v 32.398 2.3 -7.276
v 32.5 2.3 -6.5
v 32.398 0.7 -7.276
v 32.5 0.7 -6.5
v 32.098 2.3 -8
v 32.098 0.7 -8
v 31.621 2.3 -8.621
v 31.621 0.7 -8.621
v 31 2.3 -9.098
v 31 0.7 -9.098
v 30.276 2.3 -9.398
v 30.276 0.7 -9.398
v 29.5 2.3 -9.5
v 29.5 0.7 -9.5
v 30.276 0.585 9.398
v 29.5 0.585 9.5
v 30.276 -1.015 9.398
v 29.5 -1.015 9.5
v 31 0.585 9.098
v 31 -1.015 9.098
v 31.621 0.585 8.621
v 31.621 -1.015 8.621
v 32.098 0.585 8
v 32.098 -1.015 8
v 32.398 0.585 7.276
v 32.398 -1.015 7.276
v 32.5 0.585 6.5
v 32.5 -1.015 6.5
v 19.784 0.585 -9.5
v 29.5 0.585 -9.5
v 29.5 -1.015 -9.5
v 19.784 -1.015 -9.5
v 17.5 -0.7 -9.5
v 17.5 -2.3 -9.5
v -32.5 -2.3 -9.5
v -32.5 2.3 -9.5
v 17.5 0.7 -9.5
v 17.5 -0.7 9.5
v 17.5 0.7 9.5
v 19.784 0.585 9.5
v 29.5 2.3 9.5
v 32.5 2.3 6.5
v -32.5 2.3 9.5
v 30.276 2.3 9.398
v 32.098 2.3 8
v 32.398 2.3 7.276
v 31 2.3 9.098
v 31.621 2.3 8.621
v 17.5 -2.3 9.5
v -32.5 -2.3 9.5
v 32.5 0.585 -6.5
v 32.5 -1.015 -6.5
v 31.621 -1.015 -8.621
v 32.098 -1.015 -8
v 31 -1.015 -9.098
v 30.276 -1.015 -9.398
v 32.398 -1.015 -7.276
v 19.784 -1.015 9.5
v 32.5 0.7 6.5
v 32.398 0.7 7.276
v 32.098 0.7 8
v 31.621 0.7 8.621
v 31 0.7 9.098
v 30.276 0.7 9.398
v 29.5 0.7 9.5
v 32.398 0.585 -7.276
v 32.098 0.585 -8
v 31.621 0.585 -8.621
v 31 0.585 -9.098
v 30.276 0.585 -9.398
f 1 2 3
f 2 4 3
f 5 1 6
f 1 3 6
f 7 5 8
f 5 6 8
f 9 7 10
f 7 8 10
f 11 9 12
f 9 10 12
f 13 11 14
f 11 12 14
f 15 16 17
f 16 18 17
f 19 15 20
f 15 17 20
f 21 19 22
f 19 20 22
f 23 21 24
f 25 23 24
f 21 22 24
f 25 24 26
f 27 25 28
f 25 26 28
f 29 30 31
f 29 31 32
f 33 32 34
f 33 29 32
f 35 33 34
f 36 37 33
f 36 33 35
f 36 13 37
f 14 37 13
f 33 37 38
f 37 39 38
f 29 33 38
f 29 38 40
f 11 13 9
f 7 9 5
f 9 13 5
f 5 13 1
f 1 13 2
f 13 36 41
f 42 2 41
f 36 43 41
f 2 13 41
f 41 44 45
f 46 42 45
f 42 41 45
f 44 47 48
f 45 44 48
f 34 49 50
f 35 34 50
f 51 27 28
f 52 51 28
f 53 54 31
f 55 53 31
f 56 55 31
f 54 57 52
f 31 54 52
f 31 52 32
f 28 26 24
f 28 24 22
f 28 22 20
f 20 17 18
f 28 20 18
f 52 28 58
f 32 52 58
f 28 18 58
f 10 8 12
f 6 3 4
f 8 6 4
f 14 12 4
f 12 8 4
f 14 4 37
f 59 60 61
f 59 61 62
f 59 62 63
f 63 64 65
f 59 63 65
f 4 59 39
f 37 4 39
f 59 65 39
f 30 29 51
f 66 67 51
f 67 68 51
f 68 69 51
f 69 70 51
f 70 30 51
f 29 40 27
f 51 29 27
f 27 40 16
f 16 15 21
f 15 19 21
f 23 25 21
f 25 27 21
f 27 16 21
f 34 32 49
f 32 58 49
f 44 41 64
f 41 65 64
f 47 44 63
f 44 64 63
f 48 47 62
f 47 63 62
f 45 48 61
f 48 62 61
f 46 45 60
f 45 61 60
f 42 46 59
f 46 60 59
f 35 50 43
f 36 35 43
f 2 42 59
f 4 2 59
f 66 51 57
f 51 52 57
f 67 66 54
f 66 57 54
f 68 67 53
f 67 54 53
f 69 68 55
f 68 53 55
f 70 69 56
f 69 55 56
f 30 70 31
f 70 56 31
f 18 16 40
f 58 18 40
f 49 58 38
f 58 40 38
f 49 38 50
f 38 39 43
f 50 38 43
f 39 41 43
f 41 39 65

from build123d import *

# Parameters (mm, degrees)
BOSS_EXTRUDE1_DEPTH = 9.5
FILLET1_R           = 3


with BuildPart() as part:
    # Sketch1 → Boss-Extrude1 (new body, symmetric)
    with BuildSketch(Plane.XY):
        Polygon((-32.5, 2.3), (32.5, 2.3), (32.5, 0.7), (17.5, 0.7), (17.5, -0.7), (19.784478645, 0.584636857), (32.5, 0.584636857), (32.5, -1.015363143), (19.784478645, -1.015363143), (17.5, -2.3), (-32.5, -2.3), align=None)
    extrude(amount=BOSS_EXTRUDE1_DEPTH, both=True)

    # Fillet1
    fillet1_edges = [part.edges().sort_by_distance(p)[0] for p in [
        (32.5, 1.5, -9.5),
        (32.5, -0.215363143, -9.5),
        (32.5, 1.5, 9.5),
        (32.5, -0.215363143, 9.5),
    ]]
    fillet(fillet1_edges, radius=FILLET1_R)


solid = part.part
